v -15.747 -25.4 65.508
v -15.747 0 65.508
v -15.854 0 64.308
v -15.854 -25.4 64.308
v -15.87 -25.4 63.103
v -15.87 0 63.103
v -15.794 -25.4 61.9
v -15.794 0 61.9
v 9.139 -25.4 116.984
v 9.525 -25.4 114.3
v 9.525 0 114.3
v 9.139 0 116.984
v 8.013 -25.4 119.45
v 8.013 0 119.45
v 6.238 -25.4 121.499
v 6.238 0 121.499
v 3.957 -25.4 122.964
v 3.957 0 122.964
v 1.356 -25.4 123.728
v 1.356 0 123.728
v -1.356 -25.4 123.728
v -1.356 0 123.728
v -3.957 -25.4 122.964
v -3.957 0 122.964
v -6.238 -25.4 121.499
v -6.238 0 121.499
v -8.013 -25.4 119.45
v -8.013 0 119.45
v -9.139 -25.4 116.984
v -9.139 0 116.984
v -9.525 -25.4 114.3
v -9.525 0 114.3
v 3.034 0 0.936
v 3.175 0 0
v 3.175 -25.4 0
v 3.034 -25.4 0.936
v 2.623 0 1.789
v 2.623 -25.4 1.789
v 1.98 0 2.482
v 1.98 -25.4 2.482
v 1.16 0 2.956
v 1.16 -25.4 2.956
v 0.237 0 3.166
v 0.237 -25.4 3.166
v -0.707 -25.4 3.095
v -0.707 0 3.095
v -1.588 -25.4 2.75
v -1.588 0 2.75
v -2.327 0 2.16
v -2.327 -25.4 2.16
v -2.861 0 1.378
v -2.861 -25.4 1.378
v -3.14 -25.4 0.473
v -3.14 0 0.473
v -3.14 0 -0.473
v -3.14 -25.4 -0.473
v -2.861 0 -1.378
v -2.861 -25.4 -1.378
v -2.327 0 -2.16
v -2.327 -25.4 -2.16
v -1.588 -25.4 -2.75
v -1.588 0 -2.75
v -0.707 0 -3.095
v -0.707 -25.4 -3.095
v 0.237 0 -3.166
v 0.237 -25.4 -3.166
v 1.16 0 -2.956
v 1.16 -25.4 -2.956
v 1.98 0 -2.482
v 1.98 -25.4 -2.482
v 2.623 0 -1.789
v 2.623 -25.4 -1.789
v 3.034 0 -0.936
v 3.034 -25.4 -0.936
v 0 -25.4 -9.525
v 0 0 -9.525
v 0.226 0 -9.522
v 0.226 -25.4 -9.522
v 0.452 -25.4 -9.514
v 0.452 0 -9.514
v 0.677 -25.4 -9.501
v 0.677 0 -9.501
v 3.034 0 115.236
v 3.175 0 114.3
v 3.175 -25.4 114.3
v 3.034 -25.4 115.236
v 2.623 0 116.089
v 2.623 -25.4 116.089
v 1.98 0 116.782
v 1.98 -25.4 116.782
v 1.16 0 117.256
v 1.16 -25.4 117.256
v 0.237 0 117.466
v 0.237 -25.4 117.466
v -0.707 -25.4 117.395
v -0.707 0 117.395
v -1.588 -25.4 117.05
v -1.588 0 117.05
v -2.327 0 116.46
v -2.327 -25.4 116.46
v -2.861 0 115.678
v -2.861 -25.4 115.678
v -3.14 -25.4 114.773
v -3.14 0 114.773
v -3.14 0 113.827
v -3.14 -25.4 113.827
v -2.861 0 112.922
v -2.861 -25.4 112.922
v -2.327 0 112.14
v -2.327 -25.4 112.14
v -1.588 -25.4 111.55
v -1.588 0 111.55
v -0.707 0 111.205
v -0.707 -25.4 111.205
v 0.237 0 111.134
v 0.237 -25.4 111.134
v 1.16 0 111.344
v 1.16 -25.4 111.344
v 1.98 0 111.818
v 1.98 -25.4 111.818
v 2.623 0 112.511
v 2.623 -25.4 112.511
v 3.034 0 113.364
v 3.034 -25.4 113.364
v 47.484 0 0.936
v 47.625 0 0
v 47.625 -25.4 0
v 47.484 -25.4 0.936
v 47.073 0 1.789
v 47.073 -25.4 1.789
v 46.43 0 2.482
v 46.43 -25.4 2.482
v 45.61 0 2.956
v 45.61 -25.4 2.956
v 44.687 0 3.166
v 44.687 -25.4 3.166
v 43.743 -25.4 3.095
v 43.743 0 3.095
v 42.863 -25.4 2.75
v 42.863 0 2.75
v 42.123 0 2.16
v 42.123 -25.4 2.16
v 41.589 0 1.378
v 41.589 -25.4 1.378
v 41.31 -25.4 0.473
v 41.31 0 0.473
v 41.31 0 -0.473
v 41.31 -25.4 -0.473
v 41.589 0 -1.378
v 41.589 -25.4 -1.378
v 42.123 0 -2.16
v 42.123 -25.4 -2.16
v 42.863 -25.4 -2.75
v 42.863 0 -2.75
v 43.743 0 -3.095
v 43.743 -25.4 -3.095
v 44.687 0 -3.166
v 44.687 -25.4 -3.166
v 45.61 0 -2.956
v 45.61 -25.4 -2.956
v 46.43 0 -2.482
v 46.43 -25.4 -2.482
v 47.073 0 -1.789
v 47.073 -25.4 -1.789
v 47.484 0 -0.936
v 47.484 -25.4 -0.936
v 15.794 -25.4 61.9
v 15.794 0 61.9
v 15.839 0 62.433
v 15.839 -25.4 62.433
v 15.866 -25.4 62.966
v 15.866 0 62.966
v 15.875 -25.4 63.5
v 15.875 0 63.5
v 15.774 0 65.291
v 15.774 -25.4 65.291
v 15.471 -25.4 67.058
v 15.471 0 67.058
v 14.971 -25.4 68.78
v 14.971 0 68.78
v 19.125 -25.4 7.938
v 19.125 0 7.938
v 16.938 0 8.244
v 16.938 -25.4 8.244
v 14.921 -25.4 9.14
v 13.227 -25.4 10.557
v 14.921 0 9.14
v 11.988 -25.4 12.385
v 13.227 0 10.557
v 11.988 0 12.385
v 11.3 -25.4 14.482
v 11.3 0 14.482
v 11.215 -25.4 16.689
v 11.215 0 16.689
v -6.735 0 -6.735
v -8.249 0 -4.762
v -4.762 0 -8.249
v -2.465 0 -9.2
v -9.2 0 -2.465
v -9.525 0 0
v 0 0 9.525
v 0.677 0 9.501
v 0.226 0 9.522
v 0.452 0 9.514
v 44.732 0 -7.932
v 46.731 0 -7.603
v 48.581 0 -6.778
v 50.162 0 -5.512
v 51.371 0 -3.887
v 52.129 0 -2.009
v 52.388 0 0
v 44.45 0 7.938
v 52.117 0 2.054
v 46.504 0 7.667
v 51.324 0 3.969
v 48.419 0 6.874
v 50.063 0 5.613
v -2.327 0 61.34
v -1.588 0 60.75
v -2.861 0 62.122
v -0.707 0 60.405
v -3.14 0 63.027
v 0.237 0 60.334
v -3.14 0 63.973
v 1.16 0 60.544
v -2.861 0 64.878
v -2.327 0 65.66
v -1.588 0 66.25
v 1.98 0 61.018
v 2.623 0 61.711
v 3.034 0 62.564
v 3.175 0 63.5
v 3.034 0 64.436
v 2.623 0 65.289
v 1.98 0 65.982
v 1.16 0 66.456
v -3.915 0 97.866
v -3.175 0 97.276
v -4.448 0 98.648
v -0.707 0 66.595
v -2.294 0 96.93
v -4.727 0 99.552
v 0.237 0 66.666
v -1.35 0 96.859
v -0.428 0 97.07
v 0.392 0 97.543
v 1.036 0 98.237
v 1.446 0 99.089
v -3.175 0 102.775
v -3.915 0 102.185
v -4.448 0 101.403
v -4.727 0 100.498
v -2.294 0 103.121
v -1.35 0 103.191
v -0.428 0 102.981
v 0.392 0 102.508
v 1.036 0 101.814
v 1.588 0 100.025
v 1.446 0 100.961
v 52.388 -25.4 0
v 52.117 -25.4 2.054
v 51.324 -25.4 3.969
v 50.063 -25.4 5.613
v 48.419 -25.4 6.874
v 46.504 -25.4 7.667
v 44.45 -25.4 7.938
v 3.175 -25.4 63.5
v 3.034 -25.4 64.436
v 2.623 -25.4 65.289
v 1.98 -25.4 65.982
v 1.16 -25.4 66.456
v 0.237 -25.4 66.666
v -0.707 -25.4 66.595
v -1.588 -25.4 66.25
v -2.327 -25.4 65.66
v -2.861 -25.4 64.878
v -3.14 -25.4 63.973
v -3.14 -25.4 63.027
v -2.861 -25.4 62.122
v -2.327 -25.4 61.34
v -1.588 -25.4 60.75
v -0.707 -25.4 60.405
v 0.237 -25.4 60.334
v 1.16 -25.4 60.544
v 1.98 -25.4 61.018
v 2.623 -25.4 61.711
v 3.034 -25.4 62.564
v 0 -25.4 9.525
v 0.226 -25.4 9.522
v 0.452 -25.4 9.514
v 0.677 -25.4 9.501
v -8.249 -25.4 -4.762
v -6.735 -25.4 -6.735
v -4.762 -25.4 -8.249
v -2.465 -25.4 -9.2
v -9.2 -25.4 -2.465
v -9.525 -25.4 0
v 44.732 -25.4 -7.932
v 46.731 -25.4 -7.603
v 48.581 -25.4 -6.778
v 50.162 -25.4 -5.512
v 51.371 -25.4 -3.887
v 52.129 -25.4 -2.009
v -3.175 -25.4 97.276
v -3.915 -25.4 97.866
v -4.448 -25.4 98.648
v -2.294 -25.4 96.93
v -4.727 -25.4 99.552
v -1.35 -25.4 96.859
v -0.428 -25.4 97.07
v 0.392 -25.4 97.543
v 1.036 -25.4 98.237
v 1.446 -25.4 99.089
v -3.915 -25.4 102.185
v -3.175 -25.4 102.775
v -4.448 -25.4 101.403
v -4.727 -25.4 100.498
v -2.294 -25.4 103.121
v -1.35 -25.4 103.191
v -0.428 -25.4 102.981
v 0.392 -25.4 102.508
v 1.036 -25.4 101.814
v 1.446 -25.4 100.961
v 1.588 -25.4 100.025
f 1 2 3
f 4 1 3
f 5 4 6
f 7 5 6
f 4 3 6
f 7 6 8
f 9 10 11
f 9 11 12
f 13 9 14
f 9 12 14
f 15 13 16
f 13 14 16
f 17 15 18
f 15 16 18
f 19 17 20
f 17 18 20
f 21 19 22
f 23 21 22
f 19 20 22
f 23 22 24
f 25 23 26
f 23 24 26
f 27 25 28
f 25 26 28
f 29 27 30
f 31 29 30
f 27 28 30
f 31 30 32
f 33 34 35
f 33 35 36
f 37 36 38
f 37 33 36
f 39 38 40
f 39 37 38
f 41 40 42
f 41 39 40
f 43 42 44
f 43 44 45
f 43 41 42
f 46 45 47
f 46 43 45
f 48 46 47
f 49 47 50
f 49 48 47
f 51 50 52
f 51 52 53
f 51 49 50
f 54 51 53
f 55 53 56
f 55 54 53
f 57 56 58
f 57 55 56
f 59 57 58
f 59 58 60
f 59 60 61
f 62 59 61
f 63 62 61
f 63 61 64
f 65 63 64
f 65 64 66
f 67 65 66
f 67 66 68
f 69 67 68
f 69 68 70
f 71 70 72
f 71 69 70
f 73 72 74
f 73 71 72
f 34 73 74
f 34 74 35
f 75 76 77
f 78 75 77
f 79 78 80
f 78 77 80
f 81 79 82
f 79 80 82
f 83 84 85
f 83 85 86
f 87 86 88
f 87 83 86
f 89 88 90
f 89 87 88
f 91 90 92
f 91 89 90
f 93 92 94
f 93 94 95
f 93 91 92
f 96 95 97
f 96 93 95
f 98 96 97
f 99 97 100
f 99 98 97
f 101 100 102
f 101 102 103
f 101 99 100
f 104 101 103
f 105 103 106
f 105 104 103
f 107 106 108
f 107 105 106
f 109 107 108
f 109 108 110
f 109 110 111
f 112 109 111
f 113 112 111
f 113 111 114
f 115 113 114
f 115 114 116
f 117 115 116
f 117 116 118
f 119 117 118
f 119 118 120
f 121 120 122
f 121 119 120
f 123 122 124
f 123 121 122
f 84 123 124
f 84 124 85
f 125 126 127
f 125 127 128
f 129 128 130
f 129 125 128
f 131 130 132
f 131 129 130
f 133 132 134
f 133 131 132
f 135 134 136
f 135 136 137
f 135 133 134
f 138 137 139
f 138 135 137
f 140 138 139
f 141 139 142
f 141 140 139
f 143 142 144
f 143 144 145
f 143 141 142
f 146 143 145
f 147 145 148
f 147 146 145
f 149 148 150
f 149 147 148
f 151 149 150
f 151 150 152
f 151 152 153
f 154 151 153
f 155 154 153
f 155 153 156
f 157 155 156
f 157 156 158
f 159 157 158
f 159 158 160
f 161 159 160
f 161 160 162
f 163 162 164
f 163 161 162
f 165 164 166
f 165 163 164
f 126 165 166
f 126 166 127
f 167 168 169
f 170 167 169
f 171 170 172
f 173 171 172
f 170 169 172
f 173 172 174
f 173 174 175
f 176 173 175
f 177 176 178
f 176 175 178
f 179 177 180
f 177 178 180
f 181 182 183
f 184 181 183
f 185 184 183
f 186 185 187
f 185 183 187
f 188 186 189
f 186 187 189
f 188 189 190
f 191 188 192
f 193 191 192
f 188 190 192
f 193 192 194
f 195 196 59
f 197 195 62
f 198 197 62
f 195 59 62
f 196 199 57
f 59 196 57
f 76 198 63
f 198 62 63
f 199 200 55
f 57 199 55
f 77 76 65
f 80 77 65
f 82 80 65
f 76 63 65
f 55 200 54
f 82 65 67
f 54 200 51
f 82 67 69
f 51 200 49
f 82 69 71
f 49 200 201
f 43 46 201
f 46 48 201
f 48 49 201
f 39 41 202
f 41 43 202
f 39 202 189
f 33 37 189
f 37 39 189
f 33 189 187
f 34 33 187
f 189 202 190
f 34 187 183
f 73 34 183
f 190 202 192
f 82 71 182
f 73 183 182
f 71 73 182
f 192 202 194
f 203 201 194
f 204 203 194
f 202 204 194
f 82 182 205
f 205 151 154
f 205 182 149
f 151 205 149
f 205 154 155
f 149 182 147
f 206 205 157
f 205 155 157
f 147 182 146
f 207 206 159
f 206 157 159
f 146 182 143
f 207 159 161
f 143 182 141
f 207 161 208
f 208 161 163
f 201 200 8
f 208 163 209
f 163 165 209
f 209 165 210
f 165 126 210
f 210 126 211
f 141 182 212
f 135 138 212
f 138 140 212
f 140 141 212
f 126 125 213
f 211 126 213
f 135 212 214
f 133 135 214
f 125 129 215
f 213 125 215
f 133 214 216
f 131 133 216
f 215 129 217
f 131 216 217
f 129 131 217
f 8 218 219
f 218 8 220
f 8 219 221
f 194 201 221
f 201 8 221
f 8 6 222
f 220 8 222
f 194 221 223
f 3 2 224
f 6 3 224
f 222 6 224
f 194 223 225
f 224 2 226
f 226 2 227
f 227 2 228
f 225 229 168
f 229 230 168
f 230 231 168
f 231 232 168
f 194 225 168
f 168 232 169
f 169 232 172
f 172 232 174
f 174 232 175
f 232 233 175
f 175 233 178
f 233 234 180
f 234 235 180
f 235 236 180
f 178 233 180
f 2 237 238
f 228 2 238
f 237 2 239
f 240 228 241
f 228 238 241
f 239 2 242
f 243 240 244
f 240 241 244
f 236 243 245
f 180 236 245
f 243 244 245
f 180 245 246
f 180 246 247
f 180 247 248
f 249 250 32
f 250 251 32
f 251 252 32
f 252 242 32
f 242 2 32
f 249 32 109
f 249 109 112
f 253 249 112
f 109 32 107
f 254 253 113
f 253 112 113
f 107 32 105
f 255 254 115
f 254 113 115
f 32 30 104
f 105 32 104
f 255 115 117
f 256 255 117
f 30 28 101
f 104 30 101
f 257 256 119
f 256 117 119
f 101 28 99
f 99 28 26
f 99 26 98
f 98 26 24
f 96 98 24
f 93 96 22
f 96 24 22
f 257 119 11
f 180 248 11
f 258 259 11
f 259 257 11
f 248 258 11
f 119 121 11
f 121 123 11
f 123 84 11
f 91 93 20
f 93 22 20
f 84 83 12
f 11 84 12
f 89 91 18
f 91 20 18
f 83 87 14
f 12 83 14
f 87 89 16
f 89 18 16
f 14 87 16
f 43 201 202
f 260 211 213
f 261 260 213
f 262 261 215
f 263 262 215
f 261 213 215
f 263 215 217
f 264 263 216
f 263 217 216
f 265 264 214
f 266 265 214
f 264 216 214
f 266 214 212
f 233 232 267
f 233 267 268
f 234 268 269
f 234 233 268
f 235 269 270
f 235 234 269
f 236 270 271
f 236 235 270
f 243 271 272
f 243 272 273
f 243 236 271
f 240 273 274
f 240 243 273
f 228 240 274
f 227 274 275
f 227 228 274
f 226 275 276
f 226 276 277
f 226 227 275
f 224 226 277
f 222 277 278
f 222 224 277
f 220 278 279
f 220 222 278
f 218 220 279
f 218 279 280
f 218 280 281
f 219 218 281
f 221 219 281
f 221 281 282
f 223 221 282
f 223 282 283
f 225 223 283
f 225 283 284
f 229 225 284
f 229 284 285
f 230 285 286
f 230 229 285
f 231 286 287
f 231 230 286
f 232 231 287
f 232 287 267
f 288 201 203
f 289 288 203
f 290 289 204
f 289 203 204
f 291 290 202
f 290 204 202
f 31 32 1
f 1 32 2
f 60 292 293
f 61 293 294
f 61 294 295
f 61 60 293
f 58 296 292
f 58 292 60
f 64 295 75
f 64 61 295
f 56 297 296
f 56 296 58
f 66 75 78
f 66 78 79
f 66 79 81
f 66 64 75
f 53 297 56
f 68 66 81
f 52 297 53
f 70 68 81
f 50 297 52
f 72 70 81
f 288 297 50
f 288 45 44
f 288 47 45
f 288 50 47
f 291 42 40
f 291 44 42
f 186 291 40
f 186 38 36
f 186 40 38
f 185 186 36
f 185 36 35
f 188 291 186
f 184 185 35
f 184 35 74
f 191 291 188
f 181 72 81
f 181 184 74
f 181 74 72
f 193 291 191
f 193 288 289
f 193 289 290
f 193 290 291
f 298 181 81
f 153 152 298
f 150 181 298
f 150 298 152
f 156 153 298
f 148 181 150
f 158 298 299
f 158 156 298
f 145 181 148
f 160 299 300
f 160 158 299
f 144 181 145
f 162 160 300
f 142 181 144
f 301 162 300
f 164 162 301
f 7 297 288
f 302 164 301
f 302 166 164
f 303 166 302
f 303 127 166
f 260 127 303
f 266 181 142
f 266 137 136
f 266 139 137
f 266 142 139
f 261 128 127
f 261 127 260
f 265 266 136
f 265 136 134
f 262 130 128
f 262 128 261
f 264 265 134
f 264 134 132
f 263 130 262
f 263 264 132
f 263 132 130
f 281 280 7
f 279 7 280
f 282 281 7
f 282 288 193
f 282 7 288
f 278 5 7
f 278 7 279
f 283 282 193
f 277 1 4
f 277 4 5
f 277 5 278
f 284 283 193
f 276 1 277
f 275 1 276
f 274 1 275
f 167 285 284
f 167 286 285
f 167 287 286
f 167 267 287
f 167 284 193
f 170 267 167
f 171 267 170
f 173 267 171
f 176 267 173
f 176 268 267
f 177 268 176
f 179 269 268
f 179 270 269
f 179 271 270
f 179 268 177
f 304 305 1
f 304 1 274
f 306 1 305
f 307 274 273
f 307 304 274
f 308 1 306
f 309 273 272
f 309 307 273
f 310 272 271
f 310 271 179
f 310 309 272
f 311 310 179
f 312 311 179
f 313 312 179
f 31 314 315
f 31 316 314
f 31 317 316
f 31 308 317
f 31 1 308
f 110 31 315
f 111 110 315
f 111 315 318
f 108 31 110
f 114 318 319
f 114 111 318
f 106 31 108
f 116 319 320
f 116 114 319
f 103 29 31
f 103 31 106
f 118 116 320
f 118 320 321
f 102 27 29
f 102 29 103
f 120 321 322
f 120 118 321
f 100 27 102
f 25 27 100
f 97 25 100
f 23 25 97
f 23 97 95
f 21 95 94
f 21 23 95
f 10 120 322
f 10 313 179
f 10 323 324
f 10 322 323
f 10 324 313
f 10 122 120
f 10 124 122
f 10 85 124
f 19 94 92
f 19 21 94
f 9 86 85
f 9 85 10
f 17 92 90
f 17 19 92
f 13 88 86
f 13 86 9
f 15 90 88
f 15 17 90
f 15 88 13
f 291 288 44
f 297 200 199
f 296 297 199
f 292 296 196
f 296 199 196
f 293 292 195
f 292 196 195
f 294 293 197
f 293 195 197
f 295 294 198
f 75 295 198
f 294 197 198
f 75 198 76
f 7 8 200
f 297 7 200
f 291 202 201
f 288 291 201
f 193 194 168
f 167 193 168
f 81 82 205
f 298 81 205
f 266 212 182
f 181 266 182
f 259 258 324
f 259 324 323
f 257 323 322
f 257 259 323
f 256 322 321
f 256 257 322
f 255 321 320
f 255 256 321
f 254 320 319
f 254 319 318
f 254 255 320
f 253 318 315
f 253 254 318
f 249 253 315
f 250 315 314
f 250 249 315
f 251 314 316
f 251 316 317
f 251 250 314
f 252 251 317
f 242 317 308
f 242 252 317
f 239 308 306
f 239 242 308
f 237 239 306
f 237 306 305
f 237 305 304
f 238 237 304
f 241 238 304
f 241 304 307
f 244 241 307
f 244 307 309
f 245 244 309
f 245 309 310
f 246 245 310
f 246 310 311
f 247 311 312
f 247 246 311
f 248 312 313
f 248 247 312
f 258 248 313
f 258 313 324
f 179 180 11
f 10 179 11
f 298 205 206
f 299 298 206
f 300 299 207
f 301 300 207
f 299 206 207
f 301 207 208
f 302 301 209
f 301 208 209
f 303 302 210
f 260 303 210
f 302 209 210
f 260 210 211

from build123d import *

# Parameters (mm, degrees)
F0_R     = 3.175
F1_DEPTH = 25.4


with BuildPart() as f1:
    # F0 (on Front) → F1 (new body)
    with BuildSketch(Plane.XZ):
        with BuildLine():
            ThreePointArc((-9.525, 114.3), (0, 104.775), (9.525, 114.3))
            ThreePointArc((9.525, 114.3), (0, 123.825), (-9.525, 114.3))
        make_face()
        with Locations((0, 114.3)):
            Circle(F0_R, mode=Mode.SUBTRACT)
        with BuildLine():
            Line((14.971058, 68.780441), (9.525, 114.3))
            ThreePointArc((9.525, 114.3), (0, 104.775), (-9.525, 114.3))
            Line((-9.525, 114.3), (-15.747457, 65.508289))
            ThreePointArc((-15.747457, 65.508289), (-1.6815, 79.285695), (14.971058, 68.780441))
        make_face()
        with Locations((-1.5875, 100.0252)):
            Circle(F0_R, mode=Mode.SUBTRACT)
        with BuildLine():
            Line((15.794203, 61.90038), (14.971058, 68.780441))
            ThreePointArc((14.971058, 68.780441), (-1.6815, 79.285695), (-15.747457, 65.508289))
            ThreePointArc((-15.747457, 65.508289), (-15.873668, 63.705667), (-15.794203, 61.90038))
            ThreePointArc((-15.794203, 61.90038), (0, 47.625), (15.794203, 61.90038))
        make_face()
        with Locations((0, 63.5)):
            Circle(F0_R, mode=Mode.SUBTRACT)
        with BuildLine():
            ThreePointArc((15.875, 63.5), (15.647383, 66.178627), (14.971058, 68.780441))
            Line((14.971058, 68.780441), (15.794203, 61.90038))
            ThreePointArc((15.794203, 61.90038), (15.854788, 62.699171), (15.875, 63.5))
        make_face()
        with BuildLine():
            Line((11.215222, 16.688789), (15.794203, 61.90038))
            ThreePointArc((15.794203, 61.90038), (0, 47.625), (-15.794203, 61.90038))
            Line((-15.794203, 61.90038), (-9.525, 0))
            ThreePointArc((-9.525, 0), (-6.735192, 6.735192), (0, 9.525))
            ThreePointArc((0, 9.525), (0.338886, 9.51897), (0.677344, 9.500886))
            ThreePointArc((0.677344, 9.500886), (6.970557, 6.491299), (9.525, 0))
            ThreePointArc((9.525, 0), (6.970557, -6.491299), (0.677344, -9.500886))
            Line((0.677344, -9.500886), (44.732405, -7.932475))
            ThreePointArc((44.732405, -7.932475), (36.513756, -0.141225), (44.45, 7.9375))
            Line((44.45, 7.9375), (19.124959, 7.9375))
            ThreePointArc((19.124959, 7.9375), (13.226887, 10.556806), (11.215222, 16.688789))
        make_face()
        with BuildLine():
            ThreePointArc((0, 9.525), (-6.735192, 6.735192), (-9.525, 0))
            ThreePointArc((-9.525, 0), (-6.735192, -6.735192), (0, -9.525))
            Line((0, -9.525), (0.677344, -9.500886))
            ThreePointArc((0.677344, -9.500886), (6.970557, -6.491299), (9.525, 0))
            ThreePointArc((9.525, 0), (6.970557, 6.491299), (0.677344, 9.500886))
            Line((0.677344, 9.500886), (0, 9.525))
        make_face()
        Circle(F0_R, mode=Mode.SUBTRACT)
        with BuildLine():
            Line((0.677344, -9.500886), (0, -9.525))
            ThreePointArc((0, -9.525), (0.338886, -9.51897), (0.677344, -9.500886))
        make_face()
        with BuildLine():
            ThreePointArc((52.3875, 0), (50.06266, 5.61266), (44.45, 7.9375))
            ThreePointArc((44.45, 7.9375), (36.513756, -0.141225), (44.732405, -7.932475))
            ThreePointArc((44.732405, -7.932475), (50.161633, -5.51191), (52.3875, 0))
        make_face()
        with Locations((44.45, 0)):
            Circle(F0_R, mode=Mode.SUBTRACT)
    extrude(amount=F1_DEPTH)


solid = f1.part
